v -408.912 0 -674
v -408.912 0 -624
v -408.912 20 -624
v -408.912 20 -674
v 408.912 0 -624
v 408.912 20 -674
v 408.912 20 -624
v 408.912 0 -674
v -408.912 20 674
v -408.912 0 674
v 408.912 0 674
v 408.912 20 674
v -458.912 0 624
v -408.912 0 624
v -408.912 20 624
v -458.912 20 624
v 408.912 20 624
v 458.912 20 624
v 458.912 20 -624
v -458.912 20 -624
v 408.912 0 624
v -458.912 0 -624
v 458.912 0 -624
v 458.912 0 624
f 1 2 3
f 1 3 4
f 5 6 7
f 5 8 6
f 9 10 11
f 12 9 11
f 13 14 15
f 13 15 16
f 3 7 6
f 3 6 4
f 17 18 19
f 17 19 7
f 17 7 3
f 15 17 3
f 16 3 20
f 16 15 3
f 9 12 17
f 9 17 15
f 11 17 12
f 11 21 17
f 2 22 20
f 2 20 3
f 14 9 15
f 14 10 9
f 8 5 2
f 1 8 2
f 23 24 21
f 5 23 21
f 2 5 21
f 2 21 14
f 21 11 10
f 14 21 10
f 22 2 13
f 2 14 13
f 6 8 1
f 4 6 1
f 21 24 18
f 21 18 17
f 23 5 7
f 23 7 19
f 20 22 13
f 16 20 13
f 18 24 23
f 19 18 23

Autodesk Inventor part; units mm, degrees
ref_plane "YZ Plane" through (0, 0, 0) normal (1, 0, 0) x (0, 1, 0)
ref_plane "XZ Plane" through (0, 0, 0) normal (0, 1, 0) x (-1, 0, 0)
ref_plane "XY Plane" through (0, 0, 0) normal (0, 0, 1) x (1, 0, 0)
sketch "Sketch1" plane through (0, 0, 0) normal (0, 1, 0) x (-1, 0, 0)
  line L0 (408.912, 674) -> (-408.912, 674)
  line L1 (-458.912, 624) -> (-458.912, -624)
  line L2 (-408.912, -674) -> (408.912, -674)
  line L3 (458.912, -624) -> (458.912, 624)
  line L4 (458.912, 674) -> (-458.912, -674) construction
  line L5 (408.912, 674) -> (408.912, 624)
  line L6 (408.912, 624) -> (458.912, 624)
  line L7 (458.912, 674) -> (408.912, 624) construction
  line L8 (408.912, 674) -> (458.912, 624) construction
  line L9 (-458.912, 624) -> (-408.912, 624)
  line L10 (-408.912, 624) -> (-408.912, 674)
  line L11 (-408.912, 674) -> (-458.912, 624) construction
  line L12 (-458.912, 674) -> (-408.912, 624) construction
  line L13 (458.912, -624) -> (408.912, -624)
  line L14 (408.912, -624) -> (408.912, -674)
  line L15 (458.912, -624) -> (408.912, -674) construction
  line L16 (408.912, -624) -> (458.912, -674) construction
  line L17 (-408.912, -624) -> (-458.912, -624)
  line L18 (-408.912, -674) -> (-408.912, -624)
  line L19 (-408.912, -624) -> (-458.912, -674) construction
  line L20 (-458.912, -624) -> (-408.912, -674) construction
  point P0 (0, 0)
  point P1 (433.912, 649)
  point P2 (-433.912, 649)
  point P3 (433.912, -649)
  point P4 (-433.912, -649)
extrude "Extrusion1" add sketch "Sketch1" along normal blind 20
properties part number "tub floor 3"
